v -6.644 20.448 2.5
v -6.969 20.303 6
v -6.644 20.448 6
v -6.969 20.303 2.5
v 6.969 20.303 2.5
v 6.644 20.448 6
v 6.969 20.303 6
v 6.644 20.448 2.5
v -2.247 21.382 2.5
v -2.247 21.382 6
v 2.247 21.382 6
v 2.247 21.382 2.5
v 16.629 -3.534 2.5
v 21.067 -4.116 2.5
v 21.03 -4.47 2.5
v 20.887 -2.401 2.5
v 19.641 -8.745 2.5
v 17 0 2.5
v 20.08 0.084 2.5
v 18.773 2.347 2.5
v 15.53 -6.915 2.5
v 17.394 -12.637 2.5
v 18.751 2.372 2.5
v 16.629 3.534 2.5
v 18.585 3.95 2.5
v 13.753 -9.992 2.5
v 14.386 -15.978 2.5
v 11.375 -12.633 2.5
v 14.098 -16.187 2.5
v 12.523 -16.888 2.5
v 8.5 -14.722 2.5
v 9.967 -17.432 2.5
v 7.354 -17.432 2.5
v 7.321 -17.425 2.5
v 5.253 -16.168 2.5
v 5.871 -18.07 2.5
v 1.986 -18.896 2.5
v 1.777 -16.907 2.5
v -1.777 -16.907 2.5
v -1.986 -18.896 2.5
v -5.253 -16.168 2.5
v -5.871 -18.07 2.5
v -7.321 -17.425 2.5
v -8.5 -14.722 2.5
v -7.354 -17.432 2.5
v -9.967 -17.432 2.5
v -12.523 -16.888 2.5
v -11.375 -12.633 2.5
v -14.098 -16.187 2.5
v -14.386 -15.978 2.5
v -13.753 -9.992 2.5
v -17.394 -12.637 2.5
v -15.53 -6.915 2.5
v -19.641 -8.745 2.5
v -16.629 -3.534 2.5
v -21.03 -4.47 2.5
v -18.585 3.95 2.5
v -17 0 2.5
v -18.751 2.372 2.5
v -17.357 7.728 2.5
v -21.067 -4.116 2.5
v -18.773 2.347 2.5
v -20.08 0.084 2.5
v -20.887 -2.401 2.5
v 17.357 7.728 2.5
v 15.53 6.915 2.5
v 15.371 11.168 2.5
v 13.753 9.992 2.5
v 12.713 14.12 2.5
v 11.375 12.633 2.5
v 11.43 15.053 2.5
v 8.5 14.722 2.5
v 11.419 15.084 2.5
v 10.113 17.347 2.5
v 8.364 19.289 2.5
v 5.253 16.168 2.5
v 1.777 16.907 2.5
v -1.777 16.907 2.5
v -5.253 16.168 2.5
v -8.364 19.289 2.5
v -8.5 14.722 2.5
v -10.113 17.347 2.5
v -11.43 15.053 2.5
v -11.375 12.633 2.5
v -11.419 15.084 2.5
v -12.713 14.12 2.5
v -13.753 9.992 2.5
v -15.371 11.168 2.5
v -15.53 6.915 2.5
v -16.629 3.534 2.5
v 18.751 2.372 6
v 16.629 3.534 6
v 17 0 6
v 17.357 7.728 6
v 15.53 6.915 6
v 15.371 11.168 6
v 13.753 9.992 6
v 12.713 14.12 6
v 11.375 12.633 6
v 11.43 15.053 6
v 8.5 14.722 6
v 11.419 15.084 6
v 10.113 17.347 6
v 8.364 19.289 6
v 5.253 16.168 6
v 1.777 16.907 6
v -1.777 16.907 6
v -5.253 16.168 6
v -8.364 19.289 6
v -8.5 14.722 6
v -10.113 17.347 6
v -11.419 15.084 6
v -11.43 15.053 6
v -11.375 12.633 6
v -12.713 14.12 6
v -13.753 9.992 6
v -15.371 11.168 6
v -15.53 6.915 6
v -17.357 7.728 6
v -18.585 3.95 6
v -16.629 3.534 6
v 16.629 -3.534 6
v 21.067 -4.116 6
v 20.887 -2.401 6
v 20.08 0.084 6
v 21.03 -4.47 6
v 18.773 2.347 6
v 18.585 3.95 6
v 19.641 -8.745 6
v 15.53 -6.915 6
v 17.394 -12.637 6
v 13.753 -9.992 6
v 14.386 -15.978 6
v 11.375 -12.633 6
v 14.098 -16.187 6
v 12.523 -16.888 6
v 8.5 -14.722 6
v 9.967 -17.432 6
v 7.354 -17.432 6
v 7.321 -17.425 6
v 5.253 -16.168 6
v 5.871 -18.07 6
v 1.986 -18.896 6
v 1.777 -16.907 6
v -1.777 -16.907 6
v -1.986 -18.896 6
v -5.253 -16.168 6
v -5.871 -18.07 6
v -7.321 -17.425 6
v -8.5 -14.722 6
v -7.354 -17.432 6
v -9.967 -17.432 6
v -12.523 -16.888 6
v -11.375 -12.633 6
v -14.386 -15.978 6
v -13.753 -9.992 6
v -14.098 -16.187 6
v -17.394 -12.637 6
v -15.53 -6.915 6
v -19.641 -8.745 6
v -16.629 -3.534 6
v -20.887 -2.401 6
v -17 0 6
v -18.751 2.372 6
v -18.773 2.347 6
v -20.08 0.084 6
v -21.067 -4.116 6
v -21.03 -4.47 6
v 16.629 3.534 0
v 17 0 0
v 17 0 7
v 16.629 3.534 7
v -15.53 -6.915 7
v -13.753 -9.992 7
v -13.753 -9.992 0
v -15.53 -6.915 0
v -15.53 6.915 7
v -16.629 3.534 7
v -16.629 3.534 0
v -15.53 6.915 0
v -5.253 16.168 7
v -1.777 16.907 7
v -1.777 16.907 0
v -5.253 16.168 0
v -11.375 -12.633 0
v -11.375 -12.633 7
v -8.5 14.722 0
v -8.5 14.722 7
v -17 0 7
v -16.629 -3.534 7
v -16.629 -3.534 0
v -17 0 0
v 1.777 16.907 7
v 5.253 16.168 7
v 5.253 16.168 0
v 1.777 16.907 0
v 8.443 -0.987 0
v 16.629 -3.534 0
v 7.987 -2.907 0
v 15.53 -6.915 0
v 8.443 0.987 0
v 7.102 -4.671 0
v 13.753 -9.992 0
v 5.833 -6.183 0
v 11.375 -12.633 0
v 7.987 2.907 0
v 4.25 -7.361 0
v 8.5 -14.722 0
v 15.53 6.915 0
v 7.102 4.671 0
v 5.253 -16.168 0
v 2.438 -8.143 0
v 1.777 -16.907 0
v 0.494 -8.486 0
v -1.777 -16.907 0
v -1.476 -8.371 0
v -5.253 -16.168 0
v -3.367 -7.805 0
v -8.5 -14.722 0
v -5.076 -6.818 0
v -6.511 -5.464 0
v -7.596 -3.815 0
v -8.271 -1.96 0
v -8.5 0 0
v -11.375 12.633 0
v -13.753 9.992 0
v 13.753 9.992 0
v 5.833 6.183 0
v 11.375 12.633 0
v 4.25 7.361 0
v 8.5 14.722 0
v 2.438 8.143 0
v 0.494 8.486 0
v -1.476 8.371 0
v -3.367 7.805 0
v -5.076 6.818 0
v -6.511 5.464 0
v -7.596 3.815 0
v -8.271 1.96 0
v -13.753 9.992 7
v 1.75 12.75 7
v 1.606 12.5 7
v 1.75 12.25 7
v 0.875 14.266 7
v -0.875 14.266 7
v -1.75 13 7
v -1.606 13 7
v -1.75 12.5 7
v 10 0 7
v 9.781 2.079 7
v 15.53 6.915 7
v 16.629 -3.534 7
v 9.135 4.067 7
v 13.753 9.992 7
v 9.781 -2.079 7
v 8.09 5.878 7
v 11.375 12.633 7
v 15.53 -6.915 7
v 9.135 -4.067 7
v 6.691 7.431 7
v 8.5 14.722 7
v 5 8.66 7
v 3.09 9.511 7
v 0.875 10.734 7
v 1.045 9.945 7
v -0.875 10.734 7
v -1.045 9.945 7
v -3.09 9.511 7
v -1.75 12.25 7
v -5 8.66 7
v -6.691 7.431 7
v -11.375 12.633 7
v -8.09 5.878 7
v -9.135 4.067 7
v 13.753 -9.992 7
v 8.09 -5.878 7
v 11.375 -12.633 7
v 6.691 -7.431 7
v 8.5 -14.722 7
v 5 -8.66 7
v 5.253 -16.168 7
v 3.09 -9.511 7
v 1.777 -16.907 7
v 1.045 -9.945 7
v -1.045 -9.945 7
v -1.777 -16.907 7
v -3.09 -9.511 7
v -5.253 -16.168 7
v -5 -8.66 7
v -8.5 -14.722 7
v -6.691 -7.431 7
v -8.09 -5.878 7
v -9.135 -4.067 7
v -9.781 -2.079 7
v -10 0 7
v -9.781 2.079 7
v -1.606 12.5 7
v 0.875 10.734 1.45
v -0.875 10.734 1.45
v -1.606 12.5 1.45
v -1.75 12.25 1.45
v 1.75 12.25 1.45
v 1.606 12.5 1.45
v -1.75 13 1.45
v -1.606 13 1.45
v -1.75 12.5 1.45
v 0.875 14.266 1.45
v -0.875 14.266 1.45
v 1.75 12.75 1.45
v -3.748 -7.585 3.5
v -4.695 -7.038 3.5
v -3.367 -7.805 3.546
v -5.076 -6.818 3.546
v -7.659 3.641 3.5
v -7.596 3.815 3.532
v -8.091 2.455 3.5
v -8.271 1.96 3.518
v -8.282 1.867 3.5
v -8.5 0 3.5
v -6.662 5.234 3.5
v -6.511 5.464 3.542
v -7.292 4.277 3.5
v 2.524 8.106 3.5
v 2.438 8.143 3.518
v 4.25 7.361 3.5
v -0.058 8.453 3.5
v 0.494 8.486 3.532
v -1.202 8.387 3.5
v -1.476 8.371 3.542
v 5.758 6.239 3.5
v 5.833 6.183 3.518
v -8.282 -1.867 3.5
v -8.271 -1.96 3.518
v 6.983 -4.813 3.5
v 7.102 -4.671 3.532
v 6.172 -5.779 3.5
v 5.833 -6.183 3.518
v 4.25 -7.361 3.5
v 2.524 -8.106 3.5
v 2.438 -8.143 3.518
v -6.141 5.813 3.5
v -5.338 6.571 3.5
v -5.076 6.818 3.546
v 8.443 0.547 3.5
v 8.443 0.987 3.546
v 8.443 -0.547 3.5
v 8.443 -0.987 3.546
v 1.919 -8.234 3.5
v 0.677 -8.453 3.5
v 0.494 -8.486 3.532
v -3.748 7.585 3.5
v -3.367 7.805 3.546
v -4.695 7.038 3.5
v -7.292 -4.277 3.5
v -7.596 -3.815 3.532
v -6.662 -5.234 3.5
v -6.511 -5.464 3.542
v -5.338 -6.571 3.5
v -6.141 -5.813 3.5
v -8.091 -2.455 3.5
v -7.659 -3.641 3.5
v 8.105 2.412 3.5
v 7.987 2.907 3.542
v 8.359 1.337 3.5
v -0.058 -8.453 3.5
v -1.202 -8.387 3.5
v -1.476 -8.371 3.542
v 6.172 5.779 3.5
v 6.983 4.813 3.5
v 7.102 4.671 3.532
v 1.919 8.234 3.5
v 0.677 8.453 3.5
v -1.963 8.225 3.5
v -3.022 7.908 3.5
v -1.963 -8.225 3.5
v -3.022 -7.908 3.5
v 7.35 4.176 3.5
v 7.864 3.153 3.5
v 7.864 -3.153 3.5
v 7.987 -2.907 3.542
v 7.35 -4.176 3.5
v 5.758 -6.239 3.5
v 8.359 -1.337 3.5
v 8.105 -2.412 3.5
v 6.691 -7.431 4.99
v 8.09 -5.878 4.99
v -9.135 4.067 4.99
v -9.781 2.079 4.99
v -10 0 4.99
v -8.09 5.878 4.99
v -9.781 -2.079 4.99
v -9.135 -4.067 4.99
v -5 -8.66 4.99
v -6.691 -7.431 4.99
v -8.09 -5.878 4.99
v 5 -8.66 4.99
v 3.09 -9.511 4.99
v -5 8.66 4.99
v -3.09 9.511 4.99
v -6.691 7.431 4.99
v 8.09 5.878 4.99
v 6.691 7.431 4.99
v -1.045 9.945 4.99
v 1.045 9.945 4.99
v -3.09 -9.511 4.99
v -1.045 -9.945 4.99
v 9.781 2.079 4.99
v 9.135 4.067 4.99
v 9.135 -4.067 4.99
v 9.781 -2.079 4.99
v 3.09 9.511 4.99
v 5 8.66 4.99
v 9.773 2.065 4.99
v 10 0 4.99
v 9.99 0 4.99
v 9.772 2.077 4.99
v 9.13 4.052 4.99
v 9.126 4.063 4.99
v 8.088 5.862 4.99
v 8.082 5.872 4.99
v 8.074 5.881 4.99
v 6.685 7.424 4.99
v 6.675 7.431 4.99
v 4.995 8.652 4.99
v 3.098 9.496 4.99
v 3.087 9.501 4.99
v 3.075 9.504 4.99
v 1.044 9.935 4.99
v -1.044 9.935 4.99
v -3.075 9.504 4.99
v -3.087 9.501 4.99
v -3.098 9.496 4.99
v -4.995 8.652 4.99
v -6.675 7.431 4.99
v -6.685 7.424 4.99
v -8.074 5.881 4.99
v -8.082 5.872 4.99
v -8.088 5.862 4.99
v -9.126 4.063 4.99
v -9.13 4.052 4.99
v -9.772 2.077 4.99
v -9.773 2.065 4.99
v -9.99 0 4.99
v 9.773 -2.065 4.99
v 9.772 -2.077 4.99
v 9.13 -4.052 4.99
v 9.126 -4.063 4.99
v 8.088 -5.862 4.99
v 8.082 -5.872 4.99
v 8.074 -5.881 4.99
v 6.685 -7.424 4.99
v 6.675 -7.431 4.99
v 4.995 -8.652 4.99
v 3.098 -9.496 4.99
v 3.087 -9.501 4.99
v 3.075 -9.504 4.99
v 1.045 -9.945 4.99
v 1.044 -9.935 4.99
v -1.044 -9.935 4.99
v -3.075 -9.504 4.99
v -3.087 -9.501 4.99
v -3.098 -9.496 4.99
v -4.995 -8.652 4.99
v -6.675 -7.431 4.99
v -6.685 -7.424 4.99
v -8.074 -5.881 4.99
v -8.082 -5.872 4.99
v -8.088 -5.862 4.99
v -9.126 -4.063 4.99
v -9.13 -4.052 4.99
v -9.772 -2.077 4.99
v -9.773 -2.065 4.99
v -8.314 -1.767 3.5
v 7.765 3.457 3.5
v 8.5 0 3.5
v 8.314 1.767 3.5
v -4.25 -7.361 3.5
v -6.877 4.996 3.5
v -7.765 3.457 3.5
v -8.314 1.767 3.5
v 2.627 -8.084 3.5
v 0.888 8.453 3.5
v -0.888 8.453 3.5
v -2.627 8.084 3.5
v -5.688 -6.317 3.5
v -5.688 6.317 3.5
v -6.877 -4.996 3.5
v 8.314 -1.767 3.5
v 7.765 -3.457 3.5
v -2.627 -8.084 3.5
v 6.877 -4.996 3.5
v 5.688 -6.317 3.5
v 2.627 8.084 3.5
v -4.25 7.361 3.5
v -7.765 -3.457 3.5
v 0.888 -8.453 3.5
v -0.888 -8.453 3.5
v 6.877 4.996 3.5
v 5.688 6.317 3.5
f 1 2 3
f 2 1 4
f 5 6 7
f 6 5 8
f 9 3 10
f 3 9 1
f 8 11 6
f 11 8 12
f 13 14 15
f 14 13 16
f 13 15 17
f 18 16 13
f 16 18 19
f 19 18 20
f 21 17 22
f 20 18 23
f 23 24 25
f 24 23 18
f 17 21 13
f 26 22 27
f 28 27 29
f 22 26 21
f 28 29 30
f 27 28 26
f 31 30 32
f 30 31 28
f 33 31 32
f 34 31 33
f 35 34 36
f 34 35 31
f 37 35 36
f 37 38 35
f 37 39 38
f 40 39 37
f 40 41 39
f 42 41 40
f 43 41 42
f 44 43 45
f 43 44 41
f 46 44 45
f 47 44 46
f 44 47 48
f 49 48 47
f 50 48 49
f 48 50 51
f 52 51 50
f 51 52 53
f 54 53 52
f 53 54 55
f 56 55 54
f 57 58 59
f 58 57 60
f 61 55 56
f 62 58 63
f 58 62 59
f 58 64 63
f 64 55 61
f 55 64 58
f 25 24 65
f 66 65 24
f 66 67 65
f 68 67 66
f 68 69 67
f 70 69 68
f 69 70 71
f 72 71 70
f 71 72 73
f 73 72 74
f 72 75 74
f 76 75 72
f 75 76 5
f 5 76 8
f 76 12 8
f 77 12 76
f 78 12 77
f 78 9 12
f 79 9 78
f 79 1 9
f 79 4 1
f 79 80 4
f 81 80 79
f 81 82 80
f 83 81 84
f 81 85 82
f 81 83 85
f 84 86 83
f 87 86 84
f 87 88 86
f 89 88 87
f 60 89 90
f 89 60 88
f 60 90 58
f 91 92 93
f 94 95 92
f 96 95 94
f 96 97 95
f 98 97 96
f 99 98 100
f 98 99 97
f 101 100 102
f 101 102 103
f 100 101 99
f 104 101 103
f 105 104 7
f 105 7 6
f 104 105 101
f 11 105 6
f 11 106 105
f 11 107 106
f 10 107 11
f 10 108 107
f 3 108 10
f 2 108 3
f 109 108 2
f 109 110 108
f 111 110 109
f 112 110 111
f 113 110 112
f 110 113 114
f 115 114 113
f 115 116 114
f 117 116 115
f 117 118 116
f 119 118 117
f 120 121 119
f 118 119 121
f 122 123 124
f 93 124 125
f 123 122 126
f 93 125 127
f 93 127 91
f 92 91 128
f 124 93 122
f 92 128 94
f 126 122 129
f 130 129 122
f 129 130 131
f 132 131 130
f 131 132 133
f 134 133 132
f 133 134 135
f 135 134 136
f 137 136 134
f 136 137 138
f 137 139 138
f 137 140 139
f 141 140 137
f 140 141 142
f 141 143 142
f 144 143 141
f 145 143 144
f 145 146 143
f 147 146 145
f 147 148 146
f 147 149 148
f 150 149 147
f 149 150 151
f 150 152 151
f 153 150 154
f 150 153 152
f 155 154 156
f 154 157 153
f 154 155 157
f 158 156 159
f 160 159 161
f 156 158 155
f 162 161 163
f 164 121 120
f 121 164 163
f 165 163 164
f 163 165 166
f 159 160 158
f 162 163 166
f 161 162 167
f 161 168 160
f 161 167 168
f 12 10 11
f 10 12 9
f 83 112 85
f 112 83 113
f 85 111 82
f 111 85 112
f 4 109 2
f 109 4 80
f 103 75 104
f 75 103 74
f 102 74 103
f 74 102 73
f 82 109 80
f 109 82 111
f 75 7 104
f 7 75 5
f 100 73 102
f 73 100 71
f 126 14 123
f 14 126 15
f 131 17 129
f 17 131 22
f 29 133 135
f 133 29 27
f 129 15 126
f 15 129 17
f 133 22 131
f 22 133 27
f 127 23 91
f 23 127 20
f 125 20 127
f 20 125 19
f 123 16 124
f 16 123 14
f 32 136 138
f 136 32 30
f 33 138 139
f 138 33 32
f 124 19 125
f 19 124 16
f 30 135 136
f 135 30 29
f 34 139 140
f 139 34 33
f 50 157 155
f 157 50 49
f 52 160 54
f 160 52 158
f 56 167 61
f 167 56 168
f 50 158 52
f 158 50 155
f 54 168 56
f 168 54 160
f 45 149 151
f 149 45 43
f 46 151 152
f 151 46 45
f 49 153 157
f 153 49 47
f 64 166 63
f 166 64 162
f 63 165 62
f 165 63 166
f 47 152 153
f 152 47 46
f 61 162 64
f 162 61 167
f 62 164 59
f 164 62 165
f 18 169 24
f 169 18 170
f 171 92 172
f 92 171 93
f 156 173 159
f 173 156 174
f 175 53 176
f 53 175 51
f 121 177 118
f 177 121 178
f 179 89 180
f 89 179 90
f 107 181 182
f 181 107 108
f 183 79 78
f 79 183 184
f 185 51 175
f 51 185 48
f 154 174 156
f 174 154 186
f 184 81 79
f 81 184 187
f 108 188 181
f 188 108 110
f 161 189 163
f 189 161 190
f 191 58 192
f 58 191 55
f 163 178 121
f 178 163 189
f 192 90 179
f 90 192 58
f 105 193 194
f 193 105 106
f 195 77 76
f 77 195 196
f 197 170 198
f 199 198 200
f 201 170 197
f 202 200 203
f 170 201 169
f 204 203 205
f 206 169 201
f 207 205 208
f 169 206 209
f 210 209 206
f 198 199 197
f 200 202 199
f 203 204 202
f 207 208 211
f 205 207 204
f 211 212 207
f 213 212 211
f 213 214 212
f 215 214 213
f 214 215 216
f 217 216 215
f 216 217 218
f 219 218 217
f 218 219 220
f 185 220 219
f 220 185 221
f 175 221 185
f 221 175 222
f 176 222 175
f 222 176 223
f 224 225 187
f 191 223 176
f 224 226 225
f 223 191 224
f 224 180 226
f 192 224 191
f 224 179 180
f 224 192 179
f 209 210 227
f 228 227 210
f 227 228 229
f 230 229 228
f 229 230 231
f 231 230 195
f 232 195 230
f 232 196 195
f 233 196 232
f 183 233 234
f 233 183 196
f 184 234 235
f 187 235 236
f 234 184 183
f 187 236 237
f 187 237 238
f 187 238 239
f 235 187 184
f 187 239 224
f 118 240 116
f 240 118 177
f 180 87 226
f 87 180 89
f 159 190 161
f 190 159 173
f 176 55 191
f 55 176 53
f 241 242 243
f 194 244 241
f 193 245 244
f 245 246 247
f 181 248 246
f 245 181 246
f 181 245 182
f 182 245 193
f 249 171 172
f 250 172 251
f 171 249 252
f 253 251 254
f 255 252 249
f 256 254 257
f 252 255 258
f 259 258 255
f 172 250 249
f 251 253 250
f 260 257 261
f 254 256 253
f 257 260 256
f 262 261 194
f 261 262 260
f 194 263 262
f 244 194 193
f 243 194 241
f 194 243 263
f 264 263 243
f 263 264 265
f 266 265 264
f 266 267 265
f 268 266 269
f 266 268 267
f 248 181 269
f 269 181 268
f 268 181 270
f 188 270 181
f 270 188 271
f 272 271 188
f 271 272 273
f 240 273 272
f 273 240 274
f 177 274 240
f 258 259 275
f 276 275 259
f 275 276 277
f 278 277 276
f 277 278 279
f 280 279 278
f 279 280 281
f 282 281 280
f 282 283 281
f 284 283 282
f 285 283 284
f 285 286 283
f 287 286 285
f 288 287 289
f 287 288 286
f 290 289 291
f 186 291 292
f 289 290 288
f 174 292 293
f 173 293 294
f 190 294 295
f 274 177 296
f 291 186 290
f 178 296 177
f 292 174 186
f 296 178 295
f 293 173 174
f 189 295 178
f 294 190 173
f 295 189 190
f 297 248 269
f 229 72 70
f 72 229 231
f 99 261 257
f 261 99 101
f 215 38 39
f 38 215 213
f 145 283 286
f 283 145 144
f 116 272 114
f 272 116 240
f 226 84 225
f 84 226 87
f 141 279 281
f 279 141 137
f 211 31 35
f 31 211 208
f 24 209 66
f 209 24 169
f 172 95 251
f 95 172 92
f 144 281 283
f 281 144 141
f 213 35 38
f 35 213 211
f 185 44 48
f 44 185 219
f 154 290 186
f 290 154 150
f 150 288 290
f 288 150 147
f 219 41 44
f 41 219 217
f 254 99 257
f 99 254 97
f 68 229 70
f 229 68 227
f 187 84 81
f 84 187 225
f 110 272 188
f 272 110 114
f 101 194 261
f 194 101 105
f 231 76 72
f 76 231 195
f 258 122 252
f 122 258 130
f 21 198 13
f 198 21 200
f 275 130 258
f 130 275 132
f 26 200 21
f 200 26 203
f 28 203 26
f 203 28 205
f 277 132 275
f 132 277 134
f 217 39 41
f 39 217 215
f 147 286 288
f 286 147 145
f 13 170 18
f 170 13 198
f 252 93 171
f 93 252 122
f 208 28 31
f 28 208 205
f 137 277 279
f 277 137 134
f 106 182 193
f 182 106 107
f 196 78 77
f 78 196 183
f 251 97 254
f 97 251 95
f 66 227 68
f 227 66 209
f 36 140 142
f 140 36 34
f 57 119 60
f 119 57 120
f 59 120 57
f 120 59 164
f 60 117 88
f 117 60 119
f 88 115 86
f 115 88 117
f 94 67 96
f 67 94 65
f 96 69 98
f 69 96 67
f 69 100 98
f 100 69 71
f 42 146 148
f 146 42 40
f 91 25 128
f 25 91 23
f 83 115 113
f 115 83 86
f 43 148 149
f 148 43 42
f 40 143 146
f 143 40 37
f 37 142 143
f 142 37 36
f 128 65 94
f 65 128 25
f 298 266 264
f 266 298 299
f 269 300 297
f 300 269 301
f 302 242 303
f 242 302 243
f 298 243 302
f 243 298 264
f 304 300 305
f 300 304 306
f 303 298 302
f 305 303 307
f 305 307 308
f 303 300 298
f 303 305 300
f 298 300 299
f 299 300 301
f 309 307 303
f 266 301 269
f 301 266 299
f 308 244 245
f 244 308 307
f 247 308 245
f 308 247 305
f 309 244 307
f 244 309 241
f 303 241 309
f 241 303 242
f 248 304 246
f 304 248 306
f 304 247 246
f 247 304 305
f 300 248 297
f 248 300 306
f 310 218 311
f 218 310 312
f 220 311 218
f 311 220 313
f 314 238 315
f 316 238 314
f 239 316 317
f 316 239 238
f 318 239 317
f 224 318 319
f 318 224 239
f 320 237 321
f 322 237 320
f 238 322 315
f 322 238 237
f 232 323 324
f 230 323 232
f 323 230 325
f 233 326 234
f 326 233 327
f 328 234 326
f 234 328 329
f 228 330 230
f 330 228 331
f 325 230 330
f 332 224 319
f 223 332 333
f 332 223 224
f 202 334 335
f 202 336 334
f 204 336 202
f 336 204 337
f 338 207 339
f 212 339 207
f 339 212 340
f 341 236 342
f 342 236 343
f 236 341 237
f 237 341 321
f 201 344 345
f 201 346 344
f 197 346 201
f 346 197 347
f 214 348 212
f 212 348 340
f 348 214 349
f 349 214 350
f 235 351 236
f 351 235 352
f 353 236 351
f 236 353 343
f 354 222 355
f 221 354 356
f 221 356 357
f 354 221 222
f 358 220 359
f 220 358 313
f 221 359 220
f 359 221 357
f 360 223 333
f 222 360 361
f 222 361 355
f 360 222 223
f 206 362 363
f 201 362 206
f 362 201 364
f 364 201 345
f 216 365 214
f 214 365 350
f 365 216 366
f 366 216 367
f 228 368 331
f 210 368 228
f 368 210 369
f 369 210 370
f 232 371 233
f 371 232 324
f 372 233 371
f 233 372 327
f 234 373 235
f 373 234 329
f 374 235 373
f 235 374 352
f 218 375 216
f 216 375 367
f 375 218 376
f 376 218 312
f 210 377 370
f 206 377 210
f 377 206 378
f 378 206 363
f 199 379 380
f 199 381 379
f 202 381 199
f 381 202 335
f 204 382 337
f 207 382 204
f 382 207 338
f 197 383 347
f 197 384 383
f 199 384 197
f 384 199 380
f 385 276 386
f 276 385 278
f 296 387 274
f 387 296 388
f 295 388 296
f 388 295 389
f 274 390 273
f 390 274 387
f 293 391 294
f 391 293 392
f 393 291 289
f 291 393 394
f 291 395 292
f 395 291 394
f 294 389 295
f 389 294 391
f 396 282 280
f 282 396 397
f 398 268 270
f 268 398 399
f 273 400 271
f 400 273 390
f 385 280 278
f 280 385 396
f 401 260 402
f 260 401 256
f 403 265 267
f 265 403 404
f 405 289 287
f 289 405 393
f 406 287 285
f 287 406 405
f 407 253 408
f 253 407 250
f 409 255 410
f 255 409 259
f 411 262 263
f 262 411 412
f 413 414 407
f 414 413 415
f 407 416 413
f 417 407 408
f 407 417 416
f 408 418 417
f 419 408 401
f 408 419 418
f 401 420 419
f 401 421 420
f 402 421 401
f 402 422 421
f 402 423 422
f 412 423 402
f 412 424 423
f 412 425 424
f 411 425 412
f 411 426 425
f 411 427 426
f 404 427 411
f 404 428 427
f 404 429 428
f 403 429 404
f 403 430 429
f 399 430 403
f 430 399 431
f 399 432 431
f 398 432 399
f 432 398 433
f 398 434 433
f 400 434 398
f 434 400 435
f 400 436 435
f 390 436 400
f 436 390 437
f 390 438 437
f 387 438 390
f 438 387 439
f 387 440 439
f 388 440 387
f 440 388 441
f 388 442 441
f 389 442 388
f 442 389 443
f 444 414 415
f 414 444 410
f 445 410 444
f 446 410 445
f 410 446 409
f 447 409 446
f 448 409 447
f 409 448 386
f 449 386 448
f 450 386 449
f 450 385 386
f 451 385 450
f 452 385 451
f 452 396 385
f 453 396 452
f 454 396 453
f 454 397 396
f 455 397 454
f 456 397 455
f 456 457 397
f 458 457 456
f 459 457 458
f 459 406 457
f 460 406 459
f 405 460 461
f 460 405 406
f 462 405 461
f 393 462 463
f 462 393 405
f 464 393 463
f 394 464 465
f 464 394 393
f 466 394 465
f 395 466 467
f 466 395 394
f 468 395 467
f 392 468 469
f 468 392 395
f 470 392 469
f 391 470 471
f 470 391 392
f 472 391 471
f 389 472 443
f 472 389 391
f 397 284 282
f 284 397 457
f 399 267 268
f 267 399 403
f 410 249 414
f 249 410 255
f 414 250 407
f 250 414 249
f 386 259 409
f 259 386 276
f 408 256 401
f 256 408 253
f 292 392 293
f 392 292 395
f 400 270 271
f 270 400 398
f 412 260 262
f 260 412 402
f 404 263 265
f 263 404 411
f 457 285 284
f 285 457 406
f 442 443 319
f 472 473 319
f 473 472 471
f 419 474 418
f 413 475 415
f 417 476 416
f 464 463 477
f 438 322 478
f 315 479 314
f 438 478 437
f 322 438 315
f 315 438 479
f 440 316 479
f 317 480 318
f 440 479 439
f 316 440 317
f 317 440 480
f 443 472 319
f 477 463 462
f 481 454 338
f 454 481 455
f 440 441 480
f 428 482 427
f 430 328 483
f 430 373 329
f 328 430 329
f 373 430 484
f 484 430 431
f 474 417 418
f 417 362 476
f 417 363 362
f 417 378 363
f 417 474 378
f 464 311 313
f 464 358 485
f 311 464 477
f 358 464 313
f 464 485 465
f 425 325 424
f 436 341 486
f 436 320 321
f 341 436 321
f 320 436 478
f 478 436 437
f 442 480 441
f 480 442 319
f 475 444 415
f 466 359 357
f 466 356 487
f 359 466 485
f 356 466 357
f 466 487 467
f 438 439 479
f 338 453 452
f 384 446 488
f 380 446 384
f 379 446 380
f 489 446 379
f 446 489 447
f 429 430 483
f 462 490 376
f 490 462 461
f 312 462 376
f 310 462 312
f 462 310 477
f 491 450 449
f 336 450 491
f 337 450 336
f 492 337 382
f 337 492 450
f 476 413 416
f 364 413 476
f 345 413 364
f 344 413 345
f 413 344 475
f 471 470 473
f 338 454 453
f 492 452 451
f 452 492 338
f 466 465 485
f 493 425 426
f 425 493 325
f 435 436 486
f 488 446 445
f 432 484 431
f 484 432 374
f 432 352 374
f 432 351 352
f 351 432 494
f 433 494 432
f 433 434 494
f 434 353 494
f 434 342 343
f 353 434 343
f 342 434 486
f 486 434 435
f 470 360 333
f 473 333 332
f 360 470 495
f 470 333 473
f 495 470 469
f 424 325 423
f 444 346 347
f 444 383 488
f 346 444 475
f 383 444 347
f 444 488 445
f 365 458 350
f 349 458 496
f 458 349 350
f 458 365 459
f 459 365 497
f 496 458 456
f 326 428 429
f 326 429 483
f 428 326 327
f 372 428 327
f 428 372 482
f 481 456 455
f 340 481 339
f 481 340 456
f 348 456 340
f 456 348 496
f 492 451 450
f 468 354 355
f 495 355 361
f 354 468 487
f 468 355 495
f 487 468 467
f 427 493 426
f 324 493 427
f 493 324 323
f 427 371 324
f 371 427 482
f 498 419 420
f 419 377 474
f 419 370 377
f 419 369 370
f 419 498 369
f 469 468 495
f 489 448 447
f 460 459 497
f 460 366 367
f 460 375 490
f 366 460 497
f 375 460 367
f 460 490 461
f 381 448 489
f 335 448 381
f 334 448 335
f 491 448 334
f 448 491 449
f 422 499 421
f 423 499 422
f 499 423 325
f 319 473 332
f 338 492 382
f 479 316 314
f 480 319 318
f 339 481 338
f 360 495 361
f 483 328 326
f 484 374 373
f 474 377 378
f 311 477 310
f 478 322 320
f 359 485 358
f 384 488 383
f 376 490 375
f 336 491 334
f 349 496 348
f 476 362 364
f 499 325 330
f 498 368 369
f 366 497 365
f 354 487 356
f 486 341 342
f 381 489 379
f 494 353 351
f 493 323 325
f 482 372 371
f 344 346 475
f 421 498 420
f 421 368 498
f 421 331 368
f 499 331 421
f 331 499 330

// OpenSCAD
translate([0, 0, 7]) rotate(a=[0,180,0]) difference() {
	union() {
		// Big cylinder for placement inside the machine.
		cylinder(h = 7, r = 17);

		// Outer cylinder; any sewing information would go here.
		translate([0, 0, 1]) cylinder(h = 3.5, r = 19);

		// Sewing Information		
		translate([0, 0, 1]){ 
			intersection() {
				cylinder(h = 3.5, r = 21.5);
				translate([0, 10, 0]) cylinder(h = 3.5, r = 12.5);
			}
			rotate(a=[0, 0, 120]) intersection() {
				cylinder(h = 3.5, r = 21.5);
				translate([0, 10, 0]) cylinder(h = 3.5, r = 12.5);
			}
			rotate(a=[0, 0, 240]) intersection() {
				cylinder(h = 3.5, r = 21.5);
				translate([0, 10, 0]) cylinder(h = 3.5, r = 12.5);
			}
		}

	}

	// Subtract the inner hole. Be very generous.
	translate([0, 0, 4])
		cylinder(h = 10, r = 8.5, center=true);

	// Subtract the lower cone.
	cylinder(h = 2.01, r = 10);

	// Subtract the diagonal layer the disk rests on.
	translate([0, 0, 2])
		cylinder(h = 1.5, r1 = 10, r2 = 8.5);

	// Transport hole
	union() {
		translate([0, 12.25, -0.05])
			cylinder(h = 5.6, r=1.75);
		translate([0, 12.75, -0.05])
			cylinder(h = 5.6, r=1.75);
		translate([0, 12.5, -0.05])
			cube(size = [1.75, 0.5, 5.6]);
	}
}
